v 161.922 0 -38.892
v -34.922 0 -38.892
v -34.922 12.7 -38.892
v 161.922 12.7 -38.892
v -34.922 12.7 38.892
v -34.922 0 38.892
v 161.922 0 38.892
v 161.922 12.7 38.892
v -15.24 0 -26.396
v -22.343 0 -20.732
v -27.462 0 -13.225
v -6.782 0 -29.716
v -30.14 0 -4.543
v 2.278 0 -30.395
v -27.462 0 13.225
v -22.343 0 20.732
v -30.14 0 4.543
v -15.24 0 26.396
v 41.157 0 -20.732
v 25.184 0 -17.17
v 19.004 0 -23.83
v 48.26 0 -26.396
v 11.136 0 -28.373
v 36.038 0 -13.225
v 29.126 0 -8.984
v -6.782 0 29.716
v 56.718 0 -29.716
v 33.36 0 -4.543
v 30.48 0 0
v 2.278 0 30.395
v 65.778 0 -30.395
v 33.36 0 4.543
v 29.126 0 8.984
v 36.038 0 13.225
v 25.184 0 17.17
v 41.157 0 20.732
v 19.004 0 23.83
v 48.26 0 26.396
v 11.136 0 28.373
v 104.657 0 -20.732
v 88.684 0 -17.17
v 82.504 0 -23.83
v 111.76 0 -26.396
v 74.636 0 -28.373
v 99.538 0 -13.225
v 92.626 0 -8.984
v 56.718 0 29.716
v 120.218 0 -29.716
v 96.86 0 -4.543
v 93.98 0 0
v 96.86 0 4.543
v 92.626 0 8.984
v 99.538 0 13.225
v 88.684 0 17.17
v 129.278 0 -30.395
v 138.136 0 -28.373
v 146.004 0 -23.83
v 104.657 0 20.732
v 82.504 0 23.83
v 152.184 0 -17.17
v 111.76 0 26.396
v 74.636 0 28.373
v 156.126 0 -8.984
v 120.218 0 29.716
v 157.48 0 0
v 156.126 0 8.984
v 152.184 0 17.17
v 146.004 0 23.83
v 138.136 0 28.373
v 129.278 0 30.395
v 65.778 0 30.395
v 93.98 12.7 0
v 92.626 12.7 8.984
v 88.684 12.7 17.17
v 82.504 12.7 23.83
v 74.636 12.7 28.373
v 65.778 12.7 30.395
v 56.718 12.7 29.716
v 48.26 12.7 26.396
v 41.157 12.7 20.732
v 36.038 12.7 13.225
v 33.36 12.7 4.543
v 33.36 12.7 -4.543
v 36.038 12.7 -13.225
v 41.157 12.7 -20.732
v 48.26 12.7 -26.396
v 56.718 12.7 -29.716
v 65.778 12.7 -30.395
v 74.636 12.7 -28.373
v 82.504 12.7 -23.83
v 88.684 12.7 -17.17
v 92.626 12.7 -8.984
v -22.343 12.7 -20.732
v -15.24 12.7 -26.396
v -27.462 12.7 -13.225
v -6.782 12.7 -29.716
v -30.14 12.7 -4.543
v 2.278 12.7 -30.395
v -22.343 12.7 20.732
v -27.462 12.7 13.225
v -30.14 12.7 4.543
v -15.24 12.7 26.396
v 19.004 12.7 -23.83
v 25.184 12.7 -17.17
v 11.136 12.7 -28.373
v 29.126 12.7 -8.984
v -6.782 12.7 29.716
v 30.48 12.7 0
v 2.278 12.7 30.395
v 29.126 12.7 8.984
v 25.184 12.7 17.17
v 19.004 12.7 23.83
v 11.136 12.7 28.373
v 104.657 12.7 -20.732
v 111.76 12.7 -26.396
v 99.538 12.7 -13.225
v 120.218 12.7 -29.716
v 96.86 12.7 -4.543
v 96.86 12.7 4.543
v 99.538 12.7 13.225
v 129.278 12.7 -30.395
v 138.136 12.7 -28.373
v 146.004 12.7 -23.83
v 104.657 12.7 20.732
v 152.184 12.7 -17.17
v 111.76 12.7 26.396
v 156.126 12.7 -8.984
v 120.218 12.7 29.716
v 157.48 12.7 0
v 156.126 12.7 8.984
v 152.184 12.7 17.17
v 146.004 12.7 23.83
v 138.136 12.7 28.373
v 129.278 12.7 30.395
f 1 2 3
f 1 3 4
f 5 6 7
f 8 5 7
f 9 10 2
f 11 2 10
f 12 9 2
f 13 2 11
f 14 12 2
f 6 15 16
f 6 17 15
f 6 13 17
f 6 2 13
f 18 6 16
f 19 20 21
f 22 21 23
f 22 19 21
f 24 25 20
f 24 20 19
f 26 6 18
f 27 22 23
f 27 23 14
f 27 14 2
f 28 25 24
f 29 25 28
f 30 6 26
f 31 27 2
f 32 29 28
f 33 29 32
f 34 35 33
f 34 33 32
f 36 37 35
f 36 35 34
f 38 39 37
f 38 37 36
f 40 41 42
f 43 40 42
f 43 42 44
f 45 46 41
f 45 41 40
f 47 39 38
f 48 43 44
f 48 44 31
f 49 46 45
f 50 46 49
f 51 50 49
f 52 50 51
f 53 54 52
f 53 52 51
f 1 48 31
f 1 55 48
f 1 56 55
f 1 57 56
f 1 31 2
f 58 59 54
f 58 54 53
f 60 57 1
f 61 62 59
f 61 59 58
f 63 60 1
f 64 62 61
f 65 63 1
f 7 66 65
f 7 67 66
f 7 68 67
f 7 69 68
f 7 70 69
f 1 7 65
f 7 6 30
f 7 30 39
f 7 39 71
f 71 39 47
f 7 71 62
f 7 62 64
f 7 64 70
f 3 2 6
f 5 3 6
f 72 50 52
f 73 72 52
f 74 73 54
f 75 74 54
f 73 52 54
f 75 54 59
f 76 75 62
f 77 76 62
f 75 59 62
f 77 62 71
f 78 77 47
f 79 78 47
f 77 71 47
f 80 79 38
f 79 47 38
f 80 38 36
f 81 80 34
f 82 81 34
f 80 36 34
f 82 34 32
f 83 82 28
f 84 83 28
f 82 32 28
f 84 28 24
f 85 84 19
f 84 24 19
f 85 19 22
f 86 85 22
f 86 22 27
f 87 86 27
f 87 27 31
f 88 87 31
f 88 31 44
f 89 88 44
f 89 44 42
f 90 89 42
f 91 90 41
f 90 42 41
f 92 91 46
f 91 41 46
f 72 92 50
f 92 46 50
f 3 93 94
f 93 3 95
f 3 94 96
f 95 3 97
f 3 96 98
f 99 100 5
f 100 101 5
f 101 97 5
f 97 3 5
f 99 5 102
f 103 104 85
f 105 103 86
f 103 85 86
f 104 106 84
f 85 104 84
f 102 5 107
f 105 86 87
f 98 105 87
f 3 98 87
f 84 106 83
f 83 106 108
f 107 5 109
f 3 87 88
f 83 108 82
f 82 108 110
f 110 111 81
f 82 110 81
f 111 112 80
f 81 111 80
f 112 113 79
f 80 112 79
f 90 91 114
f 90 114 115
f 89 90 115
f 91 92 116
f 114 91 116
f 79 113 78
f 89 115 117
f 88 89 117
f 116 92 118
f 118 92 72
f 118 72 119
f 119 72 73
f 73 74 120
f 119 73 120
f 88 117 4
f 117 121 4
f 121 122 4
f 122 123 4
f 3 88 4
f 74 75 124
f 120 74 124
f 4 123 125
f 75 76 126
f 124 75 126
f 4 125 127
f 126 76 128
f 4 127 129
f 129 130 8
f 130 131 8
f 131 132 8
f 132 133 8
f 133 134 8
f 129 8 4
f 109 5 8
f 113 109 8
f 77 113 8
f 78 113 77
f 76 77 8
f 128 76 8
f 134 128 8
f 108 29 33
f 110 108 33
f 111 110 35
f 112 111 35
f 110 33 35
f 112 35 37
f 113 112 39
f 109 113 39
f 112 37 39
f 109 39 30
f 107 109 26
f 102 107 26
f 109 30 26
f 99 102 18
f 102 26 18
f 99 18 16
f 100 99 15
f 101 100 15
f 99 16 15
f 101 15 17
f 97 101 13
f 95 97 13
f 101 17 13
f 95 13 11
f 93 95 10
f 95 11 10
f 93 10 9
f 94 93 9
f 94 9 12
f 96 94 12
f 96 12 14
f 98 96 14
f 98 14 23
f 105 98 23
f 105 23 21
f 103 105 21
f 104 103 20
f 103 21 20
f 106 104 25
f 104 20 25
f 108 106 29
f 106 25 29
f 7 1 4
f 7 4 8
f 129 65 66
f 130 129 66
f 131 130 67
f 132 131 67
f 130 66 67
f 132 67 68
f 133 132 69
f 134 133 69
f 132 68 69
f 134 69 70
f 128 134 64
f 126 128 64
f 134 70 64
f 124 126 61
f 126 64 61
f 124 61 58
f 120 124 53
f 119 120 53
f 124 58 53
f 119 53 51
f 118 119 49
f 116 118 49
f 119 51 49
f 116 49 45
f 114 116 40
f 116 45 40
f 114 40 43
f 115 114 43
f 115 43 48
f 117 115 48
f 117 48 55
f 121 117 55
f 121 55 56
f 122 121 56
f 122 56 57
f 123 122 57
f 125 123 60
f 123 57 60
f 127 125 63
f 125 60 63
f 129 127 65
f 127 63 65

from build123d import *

# Parameters (mm, degrees)
F0_W     = 196.844284
F0_H     = 77.783168
F0_R     = 30.48
F1_DEPTH = 12.7


with BuildPart() as f1:
    # F0 (on Front) → F1 (new body)
    with BuildSketch(Plane.XZ):
        with Locations((63.5, 0)):
            Rectangle(F0_W, F0_H)
        Circle(F0_R, mode=Mode.SUBTRACT)
        with Locations((63.5, 0)):
            Circle(F0_R, mode=Mode.SUBTRACT)
        with Locations((127, 0)):
            Circle(F0_R, mode=Mode.SUBTRACT)
    extrude(amount=-F1_DEPTH)


solid = f1.part
